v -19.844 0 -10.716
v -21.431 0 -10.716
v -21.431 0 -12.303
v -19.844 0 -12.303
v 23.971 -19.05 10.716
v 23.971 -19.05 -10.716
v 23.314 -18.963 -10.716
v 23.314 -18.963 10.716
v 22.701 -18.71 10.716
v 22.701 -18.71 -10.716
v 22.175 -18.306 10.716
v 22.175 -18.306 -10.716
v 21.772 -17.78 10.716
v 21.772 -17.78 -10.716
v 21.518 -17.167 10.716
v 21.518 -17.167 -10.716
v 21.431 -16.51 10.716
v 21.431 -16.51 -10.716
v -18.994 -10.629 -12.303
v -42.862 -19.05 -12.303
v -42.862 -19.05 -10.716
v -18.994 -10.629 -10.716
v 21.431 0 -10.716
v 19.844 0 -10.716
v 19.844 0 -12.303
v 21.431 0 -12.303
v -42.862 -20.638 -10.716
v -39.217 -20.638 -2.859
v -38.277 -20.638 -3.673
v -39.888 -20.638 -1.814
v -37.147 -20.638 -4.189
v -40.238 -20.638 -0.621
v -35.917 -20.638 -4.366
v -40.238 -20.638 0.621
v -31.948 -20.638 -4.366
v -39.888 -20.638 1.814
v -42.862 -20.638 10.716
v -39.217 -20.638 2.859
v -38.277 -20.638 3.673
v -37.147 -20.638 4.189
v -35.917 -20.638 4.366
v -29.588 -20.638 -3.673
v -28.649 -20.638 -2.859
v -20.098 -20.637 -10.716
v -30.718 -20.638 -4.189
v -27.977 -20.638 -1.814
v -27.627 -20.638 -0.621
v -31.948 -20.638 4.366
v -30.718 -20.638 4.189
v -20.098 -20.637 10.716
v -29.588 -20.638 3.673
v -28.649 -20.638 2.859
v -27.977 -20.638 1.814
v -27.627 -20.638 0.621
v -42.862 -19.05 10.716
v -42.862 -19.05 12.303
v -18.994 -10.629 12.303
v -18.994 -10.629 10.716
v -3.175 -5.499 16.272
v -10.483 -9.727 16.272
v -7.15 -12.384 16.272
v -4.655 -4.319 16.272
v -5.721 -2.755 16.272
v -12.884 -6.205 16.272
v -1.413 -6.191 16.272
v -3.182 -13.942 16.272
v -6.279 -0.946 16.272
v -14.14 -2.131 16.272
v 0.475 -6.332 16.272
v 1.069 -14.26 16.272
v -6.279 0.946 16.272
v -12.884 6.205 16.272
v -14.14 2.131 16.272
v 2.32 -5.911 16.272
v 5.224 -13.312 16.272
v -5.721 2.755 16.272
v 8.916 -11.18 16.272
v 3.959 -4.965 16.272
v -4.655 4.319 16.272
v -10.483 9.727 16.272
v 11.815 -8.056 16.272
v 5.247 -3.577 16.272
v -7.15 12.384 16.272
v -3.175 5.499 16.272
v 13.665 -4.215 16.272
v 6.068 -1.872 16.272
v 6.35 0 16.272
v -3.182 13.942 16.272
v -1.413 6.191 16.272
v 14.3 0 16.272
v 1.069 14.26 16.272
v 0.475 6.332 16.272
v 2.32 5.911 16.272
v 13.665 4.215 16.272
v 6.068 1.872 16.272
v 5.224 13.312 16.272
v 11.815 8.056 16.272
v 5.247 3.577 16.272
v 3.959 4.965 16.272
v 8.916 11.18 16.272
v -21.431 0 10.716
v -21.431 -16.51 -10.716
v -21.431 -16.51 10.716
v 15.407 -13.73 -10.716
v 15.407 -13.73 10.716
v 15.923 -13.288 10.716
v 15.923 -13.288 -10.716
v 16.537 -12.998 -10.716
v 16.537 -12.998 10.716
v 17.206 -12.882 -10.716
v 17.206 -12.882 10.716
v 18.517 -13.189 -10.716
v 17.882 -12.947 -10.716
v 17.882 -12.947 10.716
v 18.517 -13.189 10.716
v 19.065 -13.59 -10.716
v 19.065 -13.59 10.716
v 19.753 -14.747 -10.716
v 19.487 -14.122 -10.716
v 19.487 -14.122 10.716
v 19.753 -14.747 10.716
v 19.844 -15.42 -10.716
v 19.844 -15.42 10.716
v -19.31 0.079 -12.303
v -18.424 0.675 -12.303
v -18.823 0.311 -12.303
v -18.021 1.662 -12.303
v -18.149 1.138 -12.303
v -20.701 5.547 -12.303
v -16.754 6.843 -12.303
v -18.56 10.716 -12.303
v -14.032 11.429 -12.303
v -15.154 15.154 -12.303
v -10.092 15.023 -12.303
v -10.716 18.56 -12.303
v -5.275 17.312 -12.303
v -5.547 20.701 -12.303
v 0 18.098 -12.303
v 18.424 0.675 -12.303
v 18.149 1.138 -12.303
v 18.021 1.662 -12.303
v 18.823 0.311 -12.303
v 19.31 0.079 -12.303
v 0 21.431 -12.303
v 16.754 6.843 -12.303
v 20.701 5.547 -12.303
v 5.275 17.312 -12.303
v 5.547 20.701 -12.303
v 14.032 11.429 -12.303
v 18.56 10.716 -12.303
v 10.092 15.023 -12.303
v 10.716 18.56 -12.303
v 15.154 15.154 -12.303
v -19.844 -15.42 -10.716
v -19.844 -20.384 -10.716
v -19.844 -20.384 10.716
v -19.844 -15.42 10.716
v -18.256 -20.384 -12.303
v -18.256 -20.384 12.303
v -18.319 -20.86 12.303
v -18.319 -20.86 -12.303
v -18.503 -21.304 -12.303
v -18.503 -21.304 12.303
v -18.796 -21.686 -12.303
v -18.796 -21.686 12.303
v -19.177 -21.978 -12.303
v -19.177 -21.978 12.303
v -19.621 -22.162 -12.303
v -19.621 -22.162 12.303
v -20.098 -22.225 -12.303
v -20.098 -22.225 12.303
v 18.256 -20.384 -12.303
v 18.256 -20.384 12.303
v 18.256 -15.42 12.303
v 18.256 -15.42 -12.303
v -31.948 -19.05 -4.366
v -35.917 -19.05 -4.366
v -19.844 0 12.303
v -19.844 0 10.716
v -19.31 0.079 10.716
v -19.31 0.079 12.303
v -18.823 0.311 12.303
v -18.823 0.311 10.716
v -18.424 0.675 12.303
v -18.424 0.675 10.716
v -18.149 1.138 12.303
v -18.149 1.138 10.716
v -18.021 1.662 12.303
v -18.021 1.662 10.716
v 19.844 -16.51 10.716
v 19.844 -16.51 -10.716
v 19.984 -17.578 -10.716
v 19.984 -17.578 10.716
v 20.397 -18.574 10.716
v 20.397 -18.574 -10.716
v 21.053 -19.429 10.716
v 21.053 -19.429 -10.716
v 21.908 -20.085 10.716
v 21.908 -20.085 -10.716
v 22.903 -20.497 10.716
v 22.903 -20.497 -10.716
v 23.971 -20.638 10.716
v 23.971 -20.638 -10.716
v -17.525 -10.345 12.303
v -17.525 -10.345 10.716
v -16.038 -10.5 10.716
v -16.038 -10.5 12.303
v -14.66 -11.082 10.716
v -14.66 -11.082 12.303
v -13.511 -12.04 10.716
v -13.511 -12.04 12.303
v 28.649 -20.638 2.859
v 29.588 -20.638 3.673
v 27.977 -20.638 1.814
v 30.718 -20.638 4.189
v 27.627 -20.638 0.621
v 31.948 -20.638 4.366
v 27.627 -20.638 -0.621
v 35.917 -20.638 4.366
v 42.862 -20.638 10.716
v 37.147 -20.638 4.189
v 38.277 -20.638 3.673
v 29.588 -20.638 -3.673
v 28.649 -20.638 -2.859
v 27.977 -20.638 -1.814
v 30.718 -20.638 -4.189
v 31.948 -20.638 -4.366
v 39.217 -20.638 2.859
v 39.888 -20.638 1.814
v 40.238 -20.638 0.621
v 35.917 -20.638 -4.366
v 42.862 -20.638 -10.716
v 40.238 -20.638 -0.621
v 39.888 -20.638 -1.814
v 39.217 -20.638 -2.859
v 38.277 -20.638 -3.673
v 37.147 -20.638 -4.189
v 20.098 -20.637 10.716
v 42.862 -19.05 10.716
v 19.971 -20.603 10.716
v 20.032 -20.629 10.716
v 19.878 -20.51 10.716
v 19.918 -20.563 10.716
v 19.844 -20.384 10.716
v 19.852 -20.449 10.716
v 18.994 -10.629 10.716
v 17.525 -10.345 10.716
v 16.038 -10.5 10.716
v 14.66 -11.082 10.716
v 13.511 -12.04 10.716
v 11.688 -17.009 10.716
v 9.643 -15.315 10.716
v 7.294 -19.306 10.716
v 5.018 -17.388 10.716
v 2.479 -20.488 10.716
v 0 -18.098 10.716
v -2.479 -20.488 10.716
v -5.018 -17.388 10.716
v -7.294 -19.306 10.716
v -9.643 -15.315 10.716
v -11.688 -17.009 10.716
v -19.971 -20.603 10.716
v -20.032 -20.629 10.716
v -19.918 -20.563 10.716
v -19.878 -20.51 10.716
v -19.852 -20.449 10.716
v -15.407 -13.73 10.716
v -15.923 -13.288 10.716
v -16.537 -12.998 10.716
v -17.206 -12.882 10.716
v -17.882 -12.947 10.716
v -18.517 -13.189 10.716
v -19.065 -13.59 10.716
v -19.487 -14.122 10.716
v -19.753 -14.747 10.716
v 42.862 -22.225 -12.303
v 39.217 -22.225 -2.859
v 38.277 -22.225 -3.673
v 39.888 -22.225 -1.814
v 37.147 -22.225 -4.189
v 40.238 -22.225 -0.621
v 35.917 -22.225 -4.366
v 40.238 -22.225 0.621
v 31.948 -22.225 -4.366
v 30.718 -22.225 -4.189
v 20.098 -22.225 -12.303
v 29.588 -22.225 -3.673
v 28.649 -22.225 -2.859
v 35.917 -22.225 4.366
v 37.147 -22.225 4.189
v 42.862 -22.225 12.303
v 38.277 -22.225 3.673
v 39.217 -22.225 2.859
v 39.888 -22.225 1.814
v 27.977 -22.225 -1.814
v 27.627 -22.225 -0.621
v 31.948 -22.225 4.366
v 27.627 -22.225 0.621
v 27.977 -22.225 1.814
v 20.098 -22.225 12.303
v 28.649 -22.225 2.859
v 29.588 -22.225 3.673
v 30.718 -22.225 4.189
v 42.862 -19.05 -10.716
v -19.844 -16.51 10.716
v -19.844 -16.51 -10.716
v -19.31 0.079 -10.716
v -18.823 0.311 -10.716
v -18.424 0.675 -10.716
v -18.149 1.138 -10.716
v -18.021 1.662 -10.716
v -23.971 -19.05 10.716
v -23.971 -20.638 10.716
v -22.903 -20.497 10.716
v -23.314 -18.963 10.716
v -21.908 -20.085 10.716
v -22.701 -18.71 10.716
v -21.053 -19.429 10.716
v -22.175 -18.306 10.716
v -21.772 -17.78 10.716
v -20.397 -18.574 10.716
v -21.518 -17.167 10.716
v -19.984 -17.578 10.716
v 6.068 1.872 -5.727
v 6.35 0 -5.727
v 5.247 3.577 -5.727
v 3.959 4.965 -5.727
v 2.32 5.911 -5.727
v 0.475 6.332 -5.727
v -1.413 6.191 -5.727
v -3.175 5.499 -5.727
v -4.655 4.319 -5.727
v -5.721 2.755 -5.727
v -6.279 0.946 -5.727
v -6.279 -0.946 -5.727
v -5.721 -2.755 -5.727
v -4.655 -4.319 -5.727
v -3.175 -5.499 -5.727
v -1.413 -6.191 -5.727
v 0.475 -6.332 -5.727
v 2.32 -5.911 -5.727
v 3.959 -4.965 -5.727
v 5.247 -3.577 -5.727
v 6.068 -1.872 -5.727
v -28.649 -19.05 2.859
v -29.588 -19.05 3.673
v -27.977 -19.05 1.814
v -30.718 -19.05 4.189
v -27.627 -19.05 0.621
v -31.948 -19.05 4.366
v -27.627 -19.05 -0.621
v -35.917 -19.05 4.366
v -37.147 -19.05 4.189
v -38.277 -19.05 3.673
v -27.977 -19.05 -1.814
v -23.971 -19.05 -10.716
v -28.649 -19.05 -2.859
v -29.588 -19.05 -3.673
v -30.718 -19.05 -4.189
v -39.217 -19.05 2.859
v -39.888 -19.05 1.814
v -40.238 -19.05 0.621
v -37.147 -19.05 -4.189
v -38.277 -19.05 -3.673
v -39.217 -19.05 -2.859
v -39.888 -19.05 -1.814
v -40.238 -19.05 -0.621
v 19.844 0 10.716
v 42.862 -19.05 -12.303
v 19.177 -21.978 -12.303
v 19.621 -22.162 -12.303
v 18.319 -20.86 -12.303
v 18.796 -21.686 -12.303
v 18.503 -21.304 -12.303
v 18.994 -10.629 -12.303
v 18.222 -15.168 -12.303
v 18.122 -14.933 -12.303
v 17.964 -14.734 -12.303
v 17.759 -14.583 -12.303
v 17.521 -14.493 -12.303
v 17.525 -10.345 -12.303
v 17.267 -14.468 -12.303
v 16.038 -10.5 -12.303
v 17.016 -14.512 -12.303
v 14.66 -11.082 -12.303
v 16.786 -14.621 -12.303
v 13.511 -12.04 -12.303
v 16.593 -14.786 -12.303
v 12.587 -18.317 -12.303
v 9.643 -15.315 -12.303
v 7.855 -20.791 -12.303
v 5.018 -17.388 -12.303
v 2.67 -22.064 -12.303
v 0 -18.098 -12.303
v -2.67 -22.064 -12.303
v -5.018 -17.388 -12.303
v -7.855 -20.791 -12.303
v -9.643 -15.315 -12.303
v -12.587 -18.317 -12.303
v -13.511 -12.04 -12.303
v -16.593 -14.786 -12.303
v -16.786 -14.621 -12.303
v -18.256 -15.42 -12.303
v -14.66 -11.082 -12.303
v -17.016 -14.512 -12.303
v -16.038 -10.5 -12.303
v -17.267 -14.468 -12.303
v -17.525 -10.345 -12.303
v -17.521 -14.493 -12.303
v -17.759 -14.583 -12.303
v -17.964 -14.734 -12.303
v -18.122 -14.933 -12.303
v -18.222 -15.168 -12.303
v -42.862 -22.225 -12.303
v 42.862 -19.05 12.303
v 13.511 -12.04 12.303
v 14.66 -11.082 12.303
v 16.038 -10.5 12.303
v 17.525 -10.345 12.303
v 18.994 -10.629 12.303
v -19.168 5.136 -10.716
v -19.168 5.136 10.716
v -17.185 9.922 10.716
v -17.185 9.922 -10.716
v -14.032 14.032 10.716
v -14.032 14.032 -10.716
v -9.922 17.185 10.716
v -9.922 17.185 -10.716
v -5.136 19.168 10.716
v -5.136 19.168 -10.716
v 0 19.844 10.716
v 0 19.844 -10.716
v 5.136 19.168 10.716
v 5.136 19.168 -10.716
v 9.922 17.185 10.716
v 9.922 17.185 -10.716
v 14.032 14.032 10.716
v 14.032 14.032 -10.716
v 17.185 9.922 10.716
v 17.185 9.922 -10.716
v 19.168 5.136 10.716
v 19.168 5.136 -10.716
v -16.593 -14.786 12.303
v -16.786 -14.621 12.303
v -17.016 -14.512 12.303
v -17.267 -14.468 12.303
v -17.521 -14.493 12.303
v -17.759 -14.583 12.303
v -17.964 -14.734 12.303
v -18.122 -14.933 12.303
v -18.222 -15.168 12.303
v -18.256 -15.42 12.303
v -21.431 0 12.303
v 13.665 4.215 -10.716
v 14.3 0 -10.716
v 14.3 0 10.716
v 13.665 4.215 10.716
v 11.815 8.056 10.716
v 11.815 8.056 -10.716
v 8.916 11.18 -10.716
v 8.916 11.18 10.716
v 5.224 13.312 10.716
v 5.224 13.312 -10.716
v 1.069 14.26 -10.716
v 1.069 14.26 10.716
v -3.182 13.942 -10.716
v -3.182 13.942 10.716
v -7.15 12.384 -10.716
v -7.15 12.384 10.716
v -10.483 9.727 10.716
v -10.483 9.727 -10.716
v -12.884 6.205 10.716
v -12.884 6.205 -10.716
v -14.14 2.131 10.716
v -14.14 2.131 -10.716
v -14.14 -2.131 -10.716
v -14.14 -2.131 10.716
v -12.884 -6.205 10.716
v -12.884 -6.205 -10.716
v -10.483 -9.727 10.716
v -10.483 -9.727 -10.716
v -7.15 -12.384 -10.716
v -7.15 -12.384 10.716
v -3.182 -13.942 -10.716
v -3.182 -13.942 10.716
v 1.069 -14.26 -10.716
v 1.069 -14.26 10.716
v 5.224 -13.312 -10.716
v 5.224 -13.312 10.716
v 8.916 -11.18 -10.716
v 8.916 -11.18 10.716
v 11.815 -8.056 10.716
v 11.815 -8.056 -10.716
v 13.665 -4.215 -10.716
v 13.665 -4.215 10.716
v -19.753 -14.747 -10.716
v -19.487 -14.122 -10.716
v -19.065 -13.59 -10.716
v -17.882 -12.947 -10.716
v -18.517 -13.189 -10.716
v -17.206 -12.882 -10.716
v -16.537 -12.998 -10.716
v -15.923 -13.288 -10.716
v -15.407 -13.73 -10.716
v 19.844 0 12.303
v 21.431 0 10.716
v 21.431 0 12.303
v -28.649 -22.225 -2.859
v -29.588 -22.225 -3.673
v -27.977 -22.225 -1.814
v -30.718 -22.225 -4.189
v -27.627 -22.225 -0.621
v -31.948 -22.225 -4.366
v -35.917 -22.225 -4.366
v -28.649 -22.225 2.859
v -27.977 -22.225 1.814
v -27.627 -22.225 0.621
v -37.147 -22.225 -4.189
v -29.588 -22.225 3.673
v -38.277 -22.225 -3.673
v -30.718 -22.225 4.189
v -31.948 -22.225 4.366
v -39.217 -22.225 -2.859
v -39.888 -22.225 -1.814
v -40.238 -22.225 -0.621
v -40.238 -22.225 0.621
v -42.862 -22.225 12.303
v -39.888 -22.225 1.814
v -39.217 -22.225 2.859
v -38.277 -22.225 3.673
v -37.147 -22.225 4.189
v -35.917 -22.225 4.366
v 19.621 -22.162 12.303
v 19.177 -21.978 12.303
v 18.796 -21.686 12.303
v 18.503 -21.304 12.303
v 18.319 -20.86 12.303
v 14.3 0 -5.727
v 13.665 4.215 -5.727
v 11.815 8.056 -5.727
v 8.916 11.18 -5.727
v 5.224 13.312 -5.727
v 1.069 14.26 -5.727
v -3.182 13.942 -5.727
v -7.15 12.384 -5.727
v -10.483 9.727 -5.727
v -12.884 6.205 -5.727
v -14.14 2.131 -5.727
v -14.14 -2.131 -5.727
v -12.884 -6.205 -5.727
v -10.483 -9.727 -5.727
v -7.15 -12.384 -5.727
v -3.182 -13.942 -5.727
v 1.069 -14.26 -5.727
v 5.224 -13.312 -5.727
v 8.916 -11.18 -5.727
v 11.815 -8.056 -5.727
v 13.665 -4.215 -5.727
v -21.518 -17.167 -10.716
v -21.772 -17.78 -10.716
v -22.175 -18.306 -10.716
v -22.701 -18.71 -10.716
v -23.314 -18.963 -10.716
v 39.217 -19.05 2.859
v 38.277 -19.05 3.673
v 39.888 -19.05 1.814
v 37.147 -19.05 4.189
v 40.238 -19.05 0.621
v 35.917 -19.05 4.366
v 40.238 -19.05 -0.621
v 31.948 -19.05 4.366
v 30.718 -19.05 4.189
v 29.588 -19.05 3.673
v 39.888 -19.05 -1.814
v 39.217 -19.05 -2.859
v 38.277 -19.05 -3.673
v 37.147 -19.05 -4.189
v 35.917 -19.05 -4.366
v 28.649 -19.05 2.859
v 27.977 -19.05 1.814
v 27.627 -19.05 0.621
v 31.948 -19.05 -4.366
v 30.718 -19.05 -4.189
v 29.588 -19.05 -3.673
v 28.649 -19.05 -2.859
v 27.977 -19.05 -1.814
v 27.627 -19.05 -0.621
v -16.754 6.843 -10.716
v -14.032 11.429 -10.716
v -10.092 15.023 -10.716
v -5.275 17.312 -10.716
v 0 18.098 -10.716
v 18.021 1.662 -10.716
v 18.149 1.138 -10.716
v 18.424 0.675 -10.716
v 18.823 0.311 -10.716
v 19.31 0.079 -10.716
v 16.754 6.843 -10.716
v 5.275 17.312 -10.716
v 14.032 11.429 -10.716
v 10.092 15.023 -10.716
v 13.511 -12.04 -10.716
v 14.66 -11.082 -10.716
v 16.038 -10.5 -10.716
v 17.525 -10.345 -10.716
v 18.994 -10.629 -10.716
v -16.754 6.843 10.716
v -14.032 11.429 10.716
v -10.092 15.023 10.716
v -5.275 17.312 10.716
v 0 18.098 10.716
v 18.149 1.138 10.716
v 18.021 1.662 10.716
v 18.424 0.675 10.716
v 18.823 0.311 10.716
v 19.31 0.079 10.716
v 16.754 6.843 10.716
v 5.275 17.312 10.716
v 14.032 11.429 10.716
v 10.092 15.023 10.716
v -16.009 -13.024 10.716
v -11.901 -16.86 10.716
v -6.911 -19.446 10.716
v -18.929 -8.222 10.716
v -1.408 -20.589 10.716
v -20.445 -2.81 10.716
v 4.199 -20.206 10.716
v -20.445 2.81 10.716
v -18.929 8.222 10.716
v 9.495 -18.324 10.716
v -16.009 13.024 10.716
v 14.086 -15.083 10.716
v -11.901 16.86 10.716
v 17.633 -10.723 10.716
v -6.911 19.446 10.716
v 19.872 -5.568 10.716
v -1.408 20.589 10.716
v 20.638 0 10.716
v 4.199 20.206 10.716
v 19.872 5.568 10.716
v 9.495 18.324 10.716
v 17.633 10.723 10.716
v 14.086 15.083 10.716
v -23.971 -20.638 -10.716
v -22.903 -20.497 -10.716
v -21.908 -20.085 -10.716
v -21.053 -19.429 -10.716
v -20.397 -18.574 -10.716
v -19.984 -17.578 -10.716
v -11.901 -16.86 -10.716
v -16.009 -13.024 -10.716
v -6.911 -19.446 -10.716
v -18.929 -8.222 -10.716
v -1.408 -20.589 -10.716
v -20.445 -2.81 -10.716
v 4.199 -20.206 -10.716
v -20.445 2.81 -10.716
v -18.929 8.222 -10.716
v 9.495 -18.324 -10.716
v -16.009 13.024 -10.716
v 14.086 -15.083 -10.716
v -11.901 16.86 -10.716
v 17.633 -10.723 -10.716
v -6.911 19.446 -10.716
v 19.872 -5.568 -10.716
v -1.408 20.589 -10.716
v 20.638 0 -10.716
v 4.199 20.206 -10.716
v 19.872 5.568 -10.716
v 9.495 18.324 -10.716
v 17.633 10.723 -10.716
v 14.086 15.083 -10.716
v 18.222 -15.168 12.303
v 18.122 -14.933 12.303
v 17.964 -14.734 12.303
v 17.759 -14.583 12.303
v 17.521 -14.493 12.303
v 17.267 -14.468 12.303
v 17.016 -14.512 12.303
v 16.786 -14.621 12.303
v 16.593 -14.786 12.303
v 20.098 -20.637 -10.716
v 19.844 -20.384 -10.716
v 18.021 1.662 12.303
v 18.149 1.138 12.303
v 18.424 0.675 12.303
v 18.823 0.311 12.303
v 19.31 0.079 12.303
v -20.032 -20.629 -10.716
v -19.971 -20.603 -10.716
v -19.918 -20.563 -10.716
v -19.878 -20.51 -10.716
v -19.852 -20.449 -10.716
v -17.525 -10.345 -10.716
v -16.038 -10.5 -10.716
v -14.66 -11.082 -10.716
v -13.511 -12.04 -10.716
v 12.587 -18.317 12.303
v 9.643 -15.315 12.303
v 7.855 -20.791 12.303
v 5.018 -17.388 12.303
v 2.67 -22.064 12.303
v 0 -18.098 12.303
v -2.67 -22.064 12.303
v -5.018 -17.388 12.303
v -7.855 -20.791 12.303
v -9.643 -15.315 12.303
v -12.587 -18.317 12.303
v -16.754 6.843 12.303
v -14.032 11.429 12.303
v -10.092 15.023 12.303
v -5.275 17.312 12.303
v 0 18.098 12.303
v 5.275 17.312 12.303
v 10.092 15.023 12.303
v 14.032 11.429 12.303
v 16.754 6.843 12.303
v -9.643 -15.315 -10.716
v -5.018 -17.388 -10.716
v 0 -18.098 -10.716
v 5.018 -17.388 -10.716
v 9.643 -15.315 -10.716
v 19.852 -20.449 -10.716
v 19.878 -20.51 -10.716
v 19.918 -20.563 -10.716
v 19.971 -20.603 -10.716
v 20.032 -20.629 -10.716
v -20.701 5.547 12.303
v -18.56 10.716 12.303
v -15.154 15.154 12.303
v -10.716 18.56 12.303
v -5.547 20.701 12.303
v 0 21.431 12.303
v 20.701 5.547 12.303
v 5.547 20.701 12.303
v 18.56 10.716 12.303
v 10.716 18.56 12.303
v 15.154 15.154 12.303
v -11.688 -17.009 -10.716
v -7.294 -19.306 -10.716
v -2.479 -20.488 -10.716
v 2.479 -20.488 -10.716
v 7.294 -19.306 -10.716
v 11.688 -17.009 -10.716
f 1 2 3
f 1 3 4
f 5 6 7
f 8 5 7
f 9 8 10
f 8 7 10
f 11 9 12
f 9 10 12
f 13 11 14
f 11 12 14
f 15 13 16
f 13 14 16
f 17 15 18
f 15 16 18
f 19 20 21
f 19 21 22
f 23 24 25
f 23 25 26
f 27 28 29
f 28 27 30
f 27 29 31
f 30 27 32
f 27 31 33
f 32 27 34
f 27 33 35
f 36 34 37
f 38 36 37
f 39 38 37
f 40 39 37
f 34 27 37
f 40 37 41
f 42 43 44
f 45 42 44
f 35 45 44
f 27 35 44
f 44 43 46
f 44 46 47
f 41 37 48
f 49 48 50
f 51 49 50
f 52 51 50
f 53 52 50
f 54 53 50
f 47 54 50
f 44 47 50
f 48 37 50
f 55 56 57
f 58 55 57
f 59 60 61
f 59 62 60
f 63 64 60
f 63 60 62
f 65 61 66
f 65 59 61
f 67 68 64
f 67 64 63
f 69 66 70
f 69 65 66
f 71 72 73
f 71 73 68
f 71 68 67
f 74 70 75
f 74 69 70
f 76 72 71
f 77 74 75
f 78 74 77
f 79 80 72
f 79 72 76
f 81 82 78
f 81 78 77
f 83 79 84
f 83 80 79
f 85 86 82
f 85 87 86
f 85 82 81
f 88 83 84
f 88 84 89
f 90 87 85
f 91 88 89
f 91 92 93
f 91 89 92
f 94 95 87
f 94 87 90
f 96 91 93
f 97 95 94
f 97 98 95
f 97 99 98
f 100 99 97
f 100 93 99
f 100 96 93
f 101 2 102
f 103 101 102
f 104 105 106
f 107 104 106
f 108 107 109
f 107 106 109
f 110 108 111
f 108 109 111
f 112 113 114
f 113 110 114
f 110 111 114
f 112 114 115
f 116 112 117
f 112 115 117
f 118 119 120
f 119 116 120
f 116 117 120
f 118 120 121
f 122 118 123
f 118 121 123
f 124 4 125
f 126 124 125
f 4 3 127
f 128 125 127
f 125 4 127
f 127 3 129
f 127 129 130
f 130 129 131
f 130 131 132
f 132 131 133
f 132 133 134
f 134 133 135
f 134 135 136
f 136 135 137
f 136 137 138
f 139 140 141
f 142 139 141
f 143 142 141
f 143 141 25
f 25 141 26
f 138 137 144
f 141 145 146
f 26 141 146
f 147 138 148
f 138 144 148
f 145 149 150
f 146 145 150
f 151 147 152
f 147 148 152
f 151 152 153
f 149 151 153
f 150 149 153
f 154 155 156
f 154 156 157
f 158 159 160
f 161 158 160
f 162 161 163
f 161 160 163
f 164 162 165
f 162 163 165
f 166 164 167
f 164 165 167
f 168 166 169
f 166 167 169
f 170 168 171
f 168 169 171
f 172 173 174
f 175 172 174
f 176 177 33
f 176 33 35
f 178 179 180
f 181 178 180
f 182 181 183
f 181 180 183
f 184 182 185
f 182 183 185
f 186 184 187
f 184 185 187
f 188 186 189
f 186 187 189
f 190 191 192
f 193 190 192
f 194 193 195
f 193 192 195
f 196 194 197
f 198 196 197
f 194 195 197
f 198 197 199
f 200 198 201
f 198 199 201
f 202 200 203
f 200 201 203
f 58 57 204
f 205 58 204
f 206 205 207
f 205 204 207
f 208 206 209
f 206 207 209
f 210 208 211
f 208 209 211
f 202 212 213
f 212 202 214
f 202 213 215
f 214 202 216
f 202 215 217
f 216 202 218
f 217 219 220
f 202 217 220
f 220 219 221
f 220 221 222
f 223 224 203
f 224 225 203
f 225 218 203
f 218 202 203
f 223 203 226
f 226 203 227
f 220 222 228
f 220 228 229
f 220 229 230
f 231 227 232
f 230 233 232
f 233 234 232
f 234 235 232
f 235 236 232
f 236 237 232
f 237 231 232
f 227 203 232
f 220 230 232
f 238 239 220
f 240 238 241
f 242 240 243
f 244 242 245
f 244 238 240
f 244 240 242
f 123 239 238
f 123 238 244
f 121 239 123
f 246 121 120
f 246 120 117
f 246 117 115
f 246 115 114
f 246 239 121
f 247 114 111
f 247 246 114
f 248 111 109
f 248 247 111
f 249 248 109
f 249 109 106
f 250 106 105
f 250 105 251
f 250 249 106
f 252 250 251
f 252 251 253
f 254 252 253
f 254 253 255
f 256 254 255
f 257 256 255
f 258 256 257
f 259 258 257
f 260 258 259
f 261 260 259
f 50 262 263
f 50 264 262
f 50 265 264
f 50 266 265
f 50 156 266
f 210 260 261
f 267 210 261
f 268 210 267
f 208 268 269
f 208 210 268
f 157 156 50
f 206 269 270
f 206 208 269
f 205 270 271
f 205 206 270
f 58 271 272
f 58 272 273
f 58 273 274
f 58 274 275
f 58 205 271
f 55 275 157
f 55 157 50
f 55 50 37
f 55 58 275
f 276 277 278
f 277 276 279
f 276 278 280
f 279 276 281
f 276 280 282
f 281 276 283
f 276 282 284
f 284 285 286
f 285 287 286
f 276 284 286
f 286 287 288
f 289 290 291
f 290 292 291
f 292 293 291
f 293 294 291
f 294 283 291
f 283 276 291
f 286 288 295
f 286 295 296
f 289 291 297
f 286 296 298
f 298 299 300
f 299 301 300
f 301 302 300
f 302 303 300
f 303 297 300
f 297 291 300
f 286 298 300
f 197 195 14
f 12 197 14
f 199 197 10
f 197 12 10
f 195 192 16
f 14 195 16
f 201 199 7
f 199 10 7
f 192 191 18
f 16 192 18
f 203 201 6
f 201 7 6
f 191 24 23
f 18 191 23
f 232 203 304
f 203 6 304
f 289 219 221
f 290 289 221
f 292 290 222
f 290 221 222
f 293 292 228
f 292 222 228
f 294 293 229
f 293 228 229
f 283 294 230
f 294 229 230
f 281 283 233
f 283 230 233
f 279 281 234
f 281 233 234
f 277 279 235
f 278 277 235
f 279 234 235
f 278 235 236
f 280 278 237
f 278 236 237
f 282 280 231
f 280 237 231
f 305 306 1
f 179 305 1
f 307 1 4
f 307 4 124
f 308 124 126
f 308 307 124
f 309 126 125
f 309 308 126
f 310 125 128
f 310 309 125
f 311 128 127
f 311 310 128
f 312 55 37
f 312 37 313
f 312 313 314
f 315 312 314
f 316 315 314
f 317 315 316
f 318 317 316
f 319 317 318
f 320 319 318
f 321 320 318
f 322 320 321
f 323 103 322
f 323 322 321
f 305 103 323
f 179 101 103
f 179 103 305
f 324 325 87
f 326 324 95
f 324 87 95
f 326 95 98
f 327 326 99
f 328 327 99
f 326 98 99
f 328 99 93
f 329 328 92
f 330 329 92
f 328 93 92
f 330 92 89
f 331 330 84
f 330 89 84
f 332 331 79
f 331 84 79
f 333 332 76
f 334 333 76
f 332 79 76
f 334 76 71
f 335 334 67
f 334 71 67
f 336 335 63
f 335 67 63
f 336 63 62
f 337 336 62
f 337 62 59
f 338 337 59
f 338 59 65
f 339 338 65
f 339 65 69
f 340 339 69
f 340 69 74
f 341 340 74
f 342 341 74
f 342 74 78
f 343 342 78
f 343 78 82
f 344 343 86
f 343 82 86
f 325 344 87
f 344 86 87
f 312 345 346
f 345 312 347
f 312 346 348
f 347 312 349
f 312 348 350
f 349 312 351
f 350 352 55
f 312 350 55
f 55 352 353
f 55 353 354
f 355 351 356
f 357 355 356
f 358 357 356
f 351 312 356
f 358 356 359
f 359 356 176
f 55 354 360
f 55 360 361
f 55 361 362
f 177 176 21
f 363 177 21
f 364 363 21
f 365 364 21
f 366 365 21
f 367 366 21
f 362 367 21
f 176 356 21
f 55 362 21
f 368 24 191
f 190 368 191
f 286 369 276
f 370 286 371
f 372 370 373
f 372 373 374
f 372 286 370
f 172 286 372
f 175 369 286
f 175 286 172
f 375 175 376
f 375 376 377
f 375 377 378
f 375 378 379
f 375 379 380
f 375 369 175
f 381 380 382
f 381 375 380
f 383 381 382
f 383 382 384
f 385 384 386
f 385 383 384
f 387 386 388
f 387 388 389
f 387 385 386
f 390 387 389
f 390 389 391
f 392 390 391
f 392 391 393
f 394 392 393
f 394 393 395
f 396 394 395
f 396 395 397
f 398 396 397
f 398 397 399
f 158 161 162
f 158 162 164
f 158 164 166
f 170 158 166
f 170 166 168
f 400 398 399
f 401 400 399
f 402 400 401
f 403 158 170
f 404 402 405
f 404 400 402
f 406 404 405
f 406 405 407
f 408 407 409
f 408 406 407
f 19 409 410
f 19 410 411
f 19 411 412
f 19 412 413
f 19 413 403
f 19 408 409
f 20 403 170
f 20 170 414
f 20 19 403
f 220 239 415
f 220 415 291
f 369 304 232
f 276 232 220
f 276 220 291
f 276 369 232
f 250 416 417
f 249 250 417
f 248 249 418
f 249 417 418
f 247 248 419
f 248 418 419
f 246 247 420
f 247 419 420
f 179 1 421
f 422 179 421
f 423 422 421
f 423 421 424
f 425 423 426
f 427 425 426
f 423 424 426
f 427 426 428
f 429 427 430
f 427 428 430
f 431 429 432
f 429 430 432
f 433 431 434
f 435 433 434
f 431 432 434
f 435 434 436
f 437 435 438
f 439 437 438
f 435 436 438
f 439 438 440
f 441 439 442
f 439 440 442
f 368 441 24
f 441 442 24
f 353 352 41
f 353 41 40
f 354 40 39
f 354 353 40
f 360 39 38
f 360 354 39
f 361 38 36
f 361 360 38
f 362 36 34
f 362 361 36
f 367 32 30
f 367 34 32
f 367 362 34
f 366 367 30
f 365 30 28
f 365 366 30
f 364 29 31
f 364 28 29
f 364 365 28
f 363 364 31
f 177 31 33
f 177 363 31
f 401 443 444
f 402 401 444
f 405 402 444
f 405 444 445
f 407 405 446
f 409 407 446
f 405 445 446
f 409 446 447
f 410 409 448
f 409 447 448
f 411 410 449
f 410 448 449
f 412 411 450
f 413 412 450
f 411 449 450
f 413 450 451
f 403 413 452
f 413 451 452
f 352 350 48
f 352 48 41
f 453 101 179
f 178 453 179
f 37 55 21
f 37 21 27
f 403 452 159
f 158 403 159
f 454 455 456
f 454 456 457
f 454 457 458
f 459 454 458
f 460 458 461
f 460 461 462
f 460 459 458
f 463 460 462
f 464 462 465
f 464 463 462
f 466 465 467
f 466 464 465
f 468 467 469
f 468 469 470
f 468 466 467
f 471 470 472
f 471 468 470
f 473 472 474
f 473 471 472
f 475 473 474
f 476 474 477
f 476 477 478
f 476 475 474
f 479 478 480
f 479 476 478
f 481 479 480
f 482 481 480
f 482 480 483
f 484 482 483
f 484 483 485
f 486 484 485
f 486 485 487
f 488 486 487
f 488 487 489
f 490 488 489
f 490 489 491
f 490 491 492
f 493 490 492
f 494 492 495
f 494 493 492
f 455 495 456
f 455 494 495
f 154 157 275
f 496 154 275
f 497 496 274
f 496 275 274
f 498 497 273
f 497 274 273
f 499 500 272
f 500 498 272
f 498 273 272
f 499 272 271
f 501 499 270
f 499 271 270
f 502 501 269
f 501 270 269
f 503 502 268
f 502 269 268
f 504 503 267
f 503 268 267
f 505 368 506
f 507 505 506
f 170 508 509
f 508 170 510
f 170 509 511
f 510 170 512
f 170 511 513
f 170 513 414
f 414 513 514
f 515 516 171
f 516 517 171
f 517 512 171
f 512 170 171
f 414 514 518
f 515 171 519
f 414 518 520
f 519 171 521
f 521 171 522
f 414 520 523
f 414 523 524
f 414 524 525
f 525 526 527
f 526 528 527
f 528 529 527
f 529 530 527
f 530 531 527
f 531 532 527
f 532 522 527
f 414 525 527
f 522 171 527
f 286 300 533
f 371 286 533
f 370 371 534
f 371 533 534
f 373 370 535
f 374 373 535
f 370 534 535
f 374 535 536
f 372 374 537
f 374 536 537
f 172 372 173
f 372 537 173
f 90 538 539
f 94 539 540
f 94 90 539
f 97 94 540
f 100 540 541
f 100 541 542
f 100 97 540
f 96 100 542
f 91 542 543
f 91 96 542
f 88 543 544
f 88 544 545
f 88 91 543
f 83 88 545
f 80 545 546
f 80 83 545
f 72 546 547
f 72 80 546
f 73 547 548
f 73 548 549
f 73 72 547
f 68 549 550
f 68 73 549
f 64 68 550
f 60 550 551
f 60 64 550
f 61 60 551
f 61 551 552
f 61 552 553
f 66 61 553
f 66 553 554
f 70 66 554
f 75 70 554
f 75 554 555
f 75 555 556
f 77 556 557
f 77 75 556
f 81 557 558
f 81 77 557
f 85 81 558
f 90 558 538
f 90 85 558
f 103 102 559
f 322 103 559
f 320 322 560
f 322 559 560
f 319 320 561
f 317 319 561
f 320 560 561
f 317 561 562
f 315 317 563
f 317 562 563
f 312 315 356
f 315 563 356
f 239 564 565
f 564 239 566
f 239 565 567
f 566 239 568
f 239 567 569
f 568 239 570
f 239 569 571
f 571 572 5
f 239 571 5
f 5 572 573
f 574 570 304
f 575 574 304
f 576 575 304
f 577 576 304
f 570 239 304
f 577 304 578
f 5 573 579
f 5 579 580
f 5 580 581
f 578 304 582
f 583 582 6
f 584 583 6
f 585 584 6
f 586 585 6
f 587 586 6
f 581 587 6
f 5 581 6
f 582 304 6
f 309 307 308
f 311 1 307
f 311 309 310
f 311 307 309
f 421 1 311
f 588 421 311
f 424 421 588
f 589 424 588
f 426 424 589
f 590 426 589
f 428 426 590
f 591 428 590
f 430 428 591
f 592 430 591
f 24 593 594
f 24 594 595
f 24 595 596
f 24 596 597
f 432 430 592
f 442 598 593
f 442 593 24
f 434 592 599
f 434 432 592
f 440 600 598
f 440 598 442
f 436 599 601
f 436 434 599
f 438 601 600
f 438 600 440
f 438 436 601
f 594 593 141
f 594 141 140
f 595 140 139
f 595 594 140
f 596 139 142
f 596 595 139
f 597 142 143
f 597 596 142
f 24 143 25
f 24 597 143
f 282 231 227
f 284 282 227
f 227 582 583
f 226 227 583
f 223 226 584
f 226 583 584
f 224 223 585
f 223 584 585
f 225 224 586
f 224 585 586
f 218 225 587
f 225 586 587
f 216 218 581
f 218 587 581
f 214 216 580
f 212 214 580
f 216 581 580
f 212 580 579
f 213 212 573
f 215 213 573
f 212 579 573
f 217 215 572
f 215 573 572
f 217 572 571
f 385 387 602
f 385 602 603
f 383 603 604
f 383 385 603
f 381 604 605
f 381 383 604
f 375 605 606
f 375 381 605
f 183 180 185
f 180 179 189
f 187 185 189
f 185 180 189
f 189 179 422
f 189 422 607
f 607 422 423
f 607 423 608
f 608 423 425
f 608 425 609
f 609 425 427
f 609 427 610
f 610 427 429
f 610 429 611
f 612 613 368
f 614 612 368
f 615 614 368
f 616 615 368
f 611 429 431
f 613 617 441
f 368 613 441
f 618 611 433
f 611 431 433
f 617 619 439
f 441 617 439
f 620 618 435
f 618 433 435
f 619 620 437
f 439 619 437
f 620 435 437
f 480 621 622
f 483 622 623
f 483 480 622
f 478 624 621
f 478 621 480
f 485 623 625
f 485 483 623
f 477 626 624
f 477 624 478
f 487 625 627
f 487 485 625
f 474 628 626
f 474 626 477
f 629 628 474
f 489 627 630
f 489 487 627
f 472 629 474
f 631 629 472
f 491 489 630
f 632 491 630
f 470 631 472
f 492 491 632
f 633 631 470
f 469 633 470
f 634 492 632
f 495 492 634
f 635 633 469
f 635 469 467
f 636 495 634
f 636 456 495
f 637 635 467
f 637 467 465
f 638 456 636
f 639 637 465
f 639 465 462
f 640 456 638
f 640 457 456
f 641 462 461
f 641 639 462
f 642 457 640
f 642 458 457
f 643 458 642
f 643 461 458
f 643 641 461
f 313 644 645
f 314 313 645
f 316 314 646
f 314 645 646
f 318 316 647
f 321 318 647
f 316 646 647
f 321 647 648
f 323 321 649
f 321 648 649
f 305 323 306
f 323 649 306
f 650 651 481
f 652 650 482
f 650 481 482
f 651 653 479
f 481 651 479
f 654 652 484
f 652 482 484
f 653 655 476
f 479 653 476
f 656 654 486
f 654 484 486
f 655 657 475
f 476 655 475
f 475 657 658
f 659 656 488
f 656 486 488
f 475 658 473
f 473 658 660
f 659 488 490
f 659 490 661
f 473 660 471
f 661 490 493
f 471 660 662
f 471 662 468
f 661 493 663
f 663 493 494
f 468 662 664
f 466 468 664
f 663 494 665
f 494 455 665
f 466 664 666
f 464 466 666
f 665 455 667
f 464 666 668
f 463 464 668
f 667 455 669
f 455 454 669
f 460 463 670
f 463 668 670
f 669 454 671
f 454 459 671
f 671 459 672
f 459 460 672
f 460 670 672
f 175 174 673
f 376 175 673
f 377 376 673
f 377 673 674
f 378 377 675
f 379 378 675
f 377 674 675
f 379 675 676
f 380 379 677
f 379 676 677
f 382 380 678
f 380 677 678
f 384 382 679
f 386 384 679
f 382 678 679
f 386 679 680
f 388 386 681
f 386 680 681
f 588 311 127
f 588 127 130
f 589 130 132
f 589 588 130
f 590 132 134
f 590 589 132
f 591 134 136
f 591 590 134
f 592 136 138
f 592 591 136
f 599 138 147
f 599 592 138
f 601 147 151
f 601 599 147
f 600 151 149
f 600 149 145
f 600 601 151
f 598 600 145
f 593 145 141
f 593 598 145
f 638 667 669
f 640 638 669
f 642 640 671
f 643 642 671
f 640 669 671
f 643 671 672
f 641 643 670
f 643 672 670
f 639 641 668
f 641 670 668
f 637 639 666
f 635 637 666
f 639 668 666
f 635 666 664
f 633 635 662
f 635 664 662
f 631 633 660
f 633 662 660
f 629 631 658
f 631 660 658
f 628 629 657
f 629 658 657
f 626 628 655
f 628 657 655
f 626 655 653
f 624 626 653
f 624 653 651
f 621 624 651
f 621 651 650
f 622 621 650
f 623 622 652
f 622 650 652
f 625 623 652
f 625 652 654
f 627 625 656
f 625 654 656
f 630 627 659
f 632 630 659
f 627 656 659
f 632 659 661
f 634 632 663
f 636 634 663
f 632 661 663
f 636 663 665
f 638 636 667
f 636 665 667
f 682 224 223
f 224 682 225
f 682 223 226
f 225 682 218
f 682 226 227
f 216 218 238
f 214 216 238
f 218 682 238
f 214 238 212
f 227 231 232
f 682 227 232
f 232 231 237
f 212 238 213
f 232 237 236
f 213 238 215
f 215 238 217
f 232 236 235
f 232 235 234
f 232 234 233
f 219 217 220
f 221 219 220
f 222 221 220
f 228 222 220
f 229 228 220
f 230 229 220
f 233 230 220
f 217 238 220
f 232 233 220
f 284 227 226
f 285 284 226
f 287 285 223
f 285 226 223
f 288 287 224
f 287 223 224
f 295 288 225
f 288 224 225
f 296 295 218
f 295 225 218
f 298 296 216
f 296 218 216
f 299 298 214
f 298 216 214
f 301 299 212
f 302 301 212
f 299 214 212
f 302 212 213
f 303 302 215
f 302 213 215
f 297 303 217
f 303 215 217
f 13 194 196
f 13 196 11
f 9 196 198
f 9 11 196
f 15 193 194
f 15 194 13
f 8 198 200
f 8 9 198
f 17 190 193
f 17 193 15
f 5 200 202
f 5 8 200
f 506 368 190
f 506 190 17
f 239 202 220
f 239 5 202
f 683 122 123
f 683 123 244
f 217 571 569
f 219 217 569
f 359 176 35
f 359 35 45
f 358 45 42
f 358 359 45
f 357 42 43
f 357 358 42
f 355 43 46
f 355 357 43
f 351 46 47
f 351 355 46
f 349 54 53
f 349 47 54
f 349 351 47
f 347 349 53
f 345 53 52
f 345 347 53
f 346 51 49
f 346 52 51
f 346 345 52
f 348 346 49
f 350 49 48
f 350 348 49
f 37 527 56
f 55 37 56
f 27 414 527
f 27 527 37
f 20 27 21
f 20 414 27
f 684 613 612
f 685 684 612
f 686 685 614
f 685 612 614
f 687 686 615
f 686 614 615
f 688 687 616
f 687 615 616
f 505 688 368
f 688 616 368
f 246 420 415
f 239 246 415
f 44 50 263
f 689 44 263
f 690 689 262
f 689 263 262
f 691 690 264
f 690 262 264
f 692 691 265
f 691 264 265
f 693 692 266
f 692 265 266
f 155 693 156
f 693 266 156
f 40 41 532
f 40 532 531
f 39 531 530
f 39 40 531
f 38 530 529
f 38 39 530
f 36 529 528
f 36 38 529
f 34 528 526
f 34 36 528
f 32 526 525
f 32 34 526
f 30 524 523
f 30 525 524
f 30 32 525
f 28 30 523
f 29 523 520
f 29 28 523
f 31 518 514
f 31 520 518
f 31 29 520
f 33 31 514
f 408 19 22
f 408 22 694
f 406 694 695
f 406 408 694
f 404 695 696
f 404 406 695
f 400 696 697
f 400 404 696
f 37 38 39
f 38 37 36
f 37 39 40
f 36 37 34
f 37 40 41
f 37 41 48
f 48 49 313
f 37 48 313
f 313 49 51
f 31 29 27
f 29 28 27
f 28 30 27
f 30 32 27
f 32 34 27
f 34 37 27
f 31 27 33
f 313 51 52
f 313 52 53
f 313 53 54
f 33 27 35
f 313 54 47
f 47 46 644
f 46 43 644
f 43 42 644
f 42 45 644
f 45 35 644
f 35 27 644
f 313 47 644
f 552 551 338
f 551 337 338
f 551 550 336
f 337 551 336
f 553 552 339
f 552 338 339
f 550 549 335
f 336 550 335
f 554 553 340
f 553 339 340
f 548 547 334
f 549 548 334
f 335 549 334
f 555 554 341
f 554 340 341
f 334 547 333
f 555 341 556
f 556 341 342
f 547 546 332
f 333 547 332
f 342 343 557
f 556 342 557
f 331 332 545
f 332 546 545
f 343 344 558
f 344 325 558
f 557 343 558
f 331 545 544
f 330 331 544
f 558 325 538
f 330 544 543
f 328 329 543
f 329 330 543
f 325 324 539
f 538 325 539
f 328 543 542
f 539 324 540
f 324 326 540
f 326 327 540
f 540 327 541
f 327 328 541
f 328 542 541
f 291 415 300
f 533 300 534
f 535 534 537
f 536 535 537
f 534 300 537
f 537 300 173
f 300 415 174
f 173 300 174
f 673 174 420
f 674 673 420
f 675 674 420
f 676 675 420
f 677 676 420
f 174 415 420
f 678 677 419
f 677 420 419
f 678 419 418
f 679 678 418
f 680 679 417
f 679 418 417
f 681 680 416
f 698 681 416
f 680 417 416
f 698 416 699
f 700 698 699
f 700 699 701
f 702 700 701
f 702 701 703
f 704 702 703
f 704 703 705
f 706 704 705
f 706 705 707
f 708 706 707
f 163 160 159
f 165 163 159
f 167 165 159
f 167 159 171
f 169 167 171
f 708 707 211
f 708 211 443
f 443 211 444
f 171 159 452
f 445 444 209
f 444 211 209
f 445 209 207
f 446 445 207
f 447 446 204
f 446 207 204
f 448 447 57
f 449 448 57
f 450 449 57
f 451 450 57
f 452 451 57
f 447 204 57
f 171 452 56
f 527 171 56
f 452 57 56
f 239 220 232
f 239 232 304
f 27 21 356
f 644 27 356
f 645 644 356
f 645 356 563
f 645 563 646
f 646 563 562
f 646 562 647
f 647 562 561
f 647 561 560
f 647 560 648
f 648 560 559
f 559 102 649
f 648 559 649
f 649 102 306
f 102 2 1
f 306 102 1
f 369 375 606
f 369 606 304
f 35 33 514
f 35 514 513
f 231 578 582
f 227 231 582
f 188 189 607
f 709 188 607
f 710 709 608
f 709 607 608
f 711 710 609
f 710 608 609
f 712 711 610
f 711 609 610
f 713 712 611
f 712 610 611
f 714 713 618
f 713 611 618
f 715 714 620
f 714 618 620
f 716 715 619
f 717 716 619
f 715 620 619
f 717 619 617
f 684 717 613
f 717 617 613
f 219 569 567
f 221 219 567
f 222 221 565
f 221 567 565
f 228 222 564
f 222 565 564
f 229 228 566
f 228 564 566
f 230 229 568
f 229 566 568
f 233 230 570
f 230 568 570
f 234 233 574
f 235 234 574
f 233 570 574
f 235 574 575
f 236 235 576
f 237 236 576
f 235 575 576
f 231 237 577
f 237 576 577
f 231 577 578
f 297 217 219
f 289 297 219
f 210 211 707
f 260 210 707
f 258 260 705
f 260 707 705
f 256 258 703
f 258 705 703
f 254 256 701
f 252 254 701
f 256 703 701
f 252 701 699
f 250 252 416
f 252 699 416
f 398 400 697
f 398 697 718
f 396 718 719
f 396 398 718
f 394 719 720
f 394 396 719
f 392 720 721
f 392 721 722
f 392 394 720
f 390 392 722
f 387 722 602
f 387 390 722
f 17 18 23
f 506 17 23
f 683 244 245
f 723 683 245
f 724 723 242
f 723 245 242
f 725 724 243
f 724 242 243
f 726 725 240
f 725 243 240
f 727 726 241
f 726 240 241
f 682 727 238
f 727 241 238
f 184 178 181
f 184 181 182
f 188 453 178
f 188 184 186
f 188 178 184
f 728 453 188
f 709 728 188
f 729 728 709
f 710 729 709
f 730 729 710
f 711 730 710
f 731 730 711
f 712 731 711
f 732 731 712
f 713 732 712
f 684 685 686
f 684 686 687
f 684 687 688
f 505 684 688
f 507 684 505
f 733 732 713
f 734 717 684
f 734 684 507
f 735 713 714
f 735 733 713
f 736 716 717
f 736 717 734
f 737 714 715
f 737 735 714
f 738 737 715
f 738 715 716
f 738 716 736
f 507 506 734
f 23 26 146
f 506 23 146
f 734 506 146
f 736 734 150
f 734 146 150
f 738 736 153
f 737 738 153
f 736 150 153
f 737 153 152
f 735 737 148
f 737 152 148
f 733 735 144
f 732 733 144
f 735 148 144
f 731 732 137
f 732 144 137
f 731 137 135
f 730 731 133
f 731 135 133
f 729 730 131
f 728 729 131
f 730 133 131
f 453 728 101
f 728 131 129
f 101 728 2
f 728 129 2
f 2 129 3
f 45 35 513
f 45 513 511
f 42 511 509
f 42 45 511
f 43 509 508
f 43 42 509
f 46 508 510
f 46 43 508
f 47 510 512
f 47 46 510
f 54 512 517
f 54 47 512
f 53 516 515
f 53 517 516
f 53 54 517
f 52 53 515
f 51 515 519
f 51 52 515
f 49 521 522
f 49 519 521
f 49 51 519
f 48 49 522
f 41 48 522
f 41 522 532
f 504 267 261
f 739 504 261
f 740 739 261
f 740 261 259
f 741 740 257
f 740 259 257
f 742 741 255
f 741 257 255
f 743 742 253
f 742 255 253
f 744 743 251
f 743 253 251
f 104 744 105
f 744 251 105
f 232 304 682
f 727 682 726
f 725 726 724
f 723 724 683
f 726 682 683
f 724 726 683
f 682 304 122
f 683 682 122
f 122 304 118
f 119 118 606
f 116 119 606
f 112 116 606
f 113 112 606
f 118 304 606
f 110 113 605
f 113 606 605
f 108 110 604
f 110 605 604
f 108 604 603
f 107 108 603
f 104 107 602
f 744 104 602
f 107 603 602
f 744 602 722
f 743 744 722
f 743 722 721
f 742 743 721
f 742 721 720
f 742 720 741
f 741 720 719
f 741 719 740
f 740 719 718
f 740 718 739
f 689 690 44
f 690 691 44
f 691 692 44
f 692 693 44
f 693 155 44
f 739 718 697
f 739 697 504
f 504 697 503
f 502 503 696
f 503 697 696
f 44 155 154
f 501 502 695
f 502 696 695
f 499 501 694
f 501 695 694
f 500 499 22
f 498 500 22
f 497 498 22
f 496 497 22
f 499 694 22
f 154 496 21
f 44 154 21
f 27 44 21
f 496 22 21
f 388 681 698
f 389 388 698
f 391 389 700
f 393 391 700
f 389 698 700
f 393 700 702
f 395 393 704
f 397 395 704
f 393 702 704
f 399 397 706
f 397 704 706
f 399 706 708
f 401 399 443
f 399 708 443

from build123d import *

# Parameters (mm, degrees)
EXTRUDE_THIN2_DEPTH  = 12.303125
EXTRUDE1_DEPTH       = 1.5875
EXTRUDE_THIN3_START  = -10.715625
EXTRUDE_THIN3_DEPTH  = 21.43125
EXTRUDE2_DEPTH       = 1.5875
EXTRUDE3_START       = -10.715625
EXTRUDE3_OUTLINE_R   = 20.6375
EXTRUDE3_OUTLINE_R_2 = 14.3002
EXTRUDE3_DEPTH       = 21.43125
SKETCH8_R            = 14.3002
SKETCH8_R_2          = 6.35
EXTRUDE4_DEPTH       = 21.99894
CUT_EXTRUDE1_DEPTH   = 51.950156499


# Read off the part's stored shape, not the designer's step: Extrude-Thin3, Extrude3
with BuildPart() as part:
    # Sketch1 → Extrude-Thin2 (new, symmetric)
    with BuildSketch(Plane.XY):
        with BuildLine():
            Line((-42.8625, -20.6375), (-20.09775, -20.6375))
            ThreePointArc((-20.09775, -20.6375), (-19.918144878, -20.563105122), (-19.84375, -20.3835))
            Line((-19.84375, -20.3835), (-19.84375, -15.420011096))
            ThreePointArc((-19.84375, -15.420011096), (-18.207905551, -13.0463846), (-15.40744863, -13.730146866))
            ThreePointArc((-15.40744863, -13.730146866), (0, -20.6375), (15.40744863, -13.730146866))
            ThreePointArc((15.40744863, -13.730146866), (18.207905551, -13.0463846), (19.84375, -15.420011096))
            Line((19.84375, -15.420011096), (19.84375, -20.3835))
            ThreePointArc((19.84375, -20.3835), (19.918144878, -20.563105122), (20.09775, -20.6375))
            Line((20.09775, -20.6375), (42.8625, -20.6375))
            Line((42.8625, -20.6375), (42.8625, -22.225))
            Line((42.8625, -22.225), (20.09775, -22.225))
            ThreePointArc((20.09775, -22.225), (18.795612862, -21.685637138), (18.25625, -20.3835))
            Line((18.25625, -20.3835), (18.25625, -15.420011096))
            ThreePointArc((18.25625, -15.420011096), (17.642808332, -14.52990116), (16.592636986, -14.786312009))
            ThreePointArc((16.592636986, -14.786312009), (0, -22.225), (-16.592636986, -14.786312009))
            ThreePointArc((-16.592636986, -14.786312009), (-17.642808332, -14.52990116), (-18.25625, -15.420011096))
            Line((-18.25625, -15.420011096), (-18.25625, -20.3835))
            ThreePointArc((-18.25625, -20.3835), (-18.795612862, -21.685637138), (-20.09775, -22.225))
            Line((-20.09775, -22.225), (-42.8625, -22.225))
            Line((-42.8625, -22.225), (-42.8625, -20.6375))
        make_face()
    extrude(amount=EXTRUDE_THIN2_DEPTH, both=True)

    # Sketch4 → Extrude1 (add)
    with BuildSketch(Plane.XY.offset(12.303125)):
        with BuildLine():
            Line((-42.8625, -19.05), (-18.993828558, -10.629391671))
            ThreePointArc((-18.993828558, -10.629391671), (-16.037730525, -10.500296197), (-13.51114726, -12.040282636))
            ThreePointArc((-13.51114726, -12.040282636), (0, -18.0975), (13.51114726, -12.040282636))
            ThreePointArc((13.51114726, -12.040282636), (16.037730525, -10.500296197), (18.993828558, -10.629391671))
            Line((18.993828558, -10.629391671), (42.8625, -19.05))
            Line((42.8625, -19.05), (42.8625, -22.225))
            Line((42.8625, -22.225), (20.09775, -22.225))
            ThreePointArc((20.09775, -22.225), (18.795612862, -21.685637138), (18.25625, -20.3835))
            Line((18.25625, -20.3835), (18.25625, -15.420011096))
            ThreePointArc((18.25625, -15.420011096), (17.642808332, -14.52990116), (16.592636986, -14.786312009))
            ThreePointArc((16.592636986, -14.786312009), (0, -22.225), (-16.592636986, -14.786312009))
            ThreePointArc((-16.592636986, -14.786312009), (-17.642808332, -14.52990116), (-18.25625, -15.420011096))
            Line((-18.25625, -15.420011096), (-18.25625, -20.3835))
            ThreePointArc((-18.25625, -20.3835), (-18.795612862, -21.685637138), (-20.09775, -22.225))
            Line((-20.09775, -22.225), (-42.8625, -22.225))
            Line((-42.8625, -22.225), (-42.8625, -19.05))
        make_face()
    extrude1 = extrude(amount=-EXTRUDE1_DEPTH)

    # Mirror1: Extrude1 across plane
    add(extrude1.mirror(Plane.XY))


with BuildPart() as body_2:
    # Extrude-Thin3 outline → Extrude-Thin3 (new body)
    with BuildSketch(Plane.XY.offset(EXTRUDE_THIN3_START)):
        with BuildLine():
            Line((-23.97125, -19.05), (-42.8625, -19.05))
            Line((-42.8625, -19.05), (-42.8625, -20.6375))
            Line((-42.8625, -20.6375), (-23.97125, -20.6375))
            ThreePointArc((-23.97125, -20.6375), (-21.052666761, -19.428583239), (-19.84375, -16.51))
            Line((-19.84375, -16.51), (-19.84375, 0))
            ThreePointArc((-19.84375, 0), (0, 19.84375), (19.84375, 0))
            Line((19.84375, 0), (19.84375, -16.51))
            ThreePointArc((19.84375, -16.51), (21.052666761, -19.428583239), (23.97125, -20.6375))
            Line((23.97125, -20.6375), (42.8625, -20.6375))
            Line((42.8625, -20.6375), (42.8625, -19.05))
            Line((42.8625, -19.05), (23.97125, -19.05))
            ThreePointArc((23.97125, -19.05), (22.175198776, -18.306051224), (21.43125, -16.51))
            Line((21.43125, -16.51), (21.43125, 0))
            ThreePointArc((21.43125, 0), (0, 21.43125), (-21.43125, 0))
            Line((-21.43125, 0), (-21.43125, -16.51))
            ThreePointArc((-21.43125, -16.51), (-22.175198776, -18.306051224), (-23.97125, -19.05))
        make_face()
    extrude(amount=EXTRUDE_THIN3_DEPTH)

    # Sketch6 → Extrude2 (add)
    with BuildSketch(Plane(origin=(0, 0, -10.715625), x_dir=(-1, 0, 0), z_dir=(0, 0, -1))):
        with BuildLine():
            Line((-19.84375, 0), (-21.43125, 0))
            ThreePointArc((-21.43125, 0), (0, 21.43125), (21.43125, 0))
            Line((21.43125, 0), (19.84375, 0))
            ThreePointArc((19.84375, 0), (18.610270538, 0.477999494), (18.020989833, 1.662357273))
            ThreePointArc((18.020989833, 1.662357273), (0, 18.0975), (-18.020989833, 1.662357273))
            ThreePointArc((-18.020989833, 1.662357273), (-18.610270538, 0.477999494), (-19.84375, 0))
        make_face()
    extrude2 = extrude(amount=EXTRUDE2_DEPTH)

    # Mirror2: Extrude2 across plane
    add(extrude2.mirror(Plane.XY))


with BuildPart() as body_3:
    # Extrude3 outline → Extrude3 (new body)
    with BuildSketch(Plane.XY.offset(EXTRUDE3_START)):
        Circle(EXTRUDE3_OUTLINE_R)
        Circle(EXTRUDE3_OUTLINE_R_2, mode=Mode.SUBTRACT)
    extrude(amount=EXTRUDE3_DEPTH)


with BuildPart() as body_4:
    # Sketch8 → Extrude4 (new body)
    with BuildSketch(Plane.XY.offset(16.271875)):
        Circle(SKETCH8_R)
        Circle(SKETCH8_R_2, mode=Mode.SUBTRACT)
    extrude(amount=-EXTRUDE4_DEPTH)


with BuildPart() as cut_extrude1_tool:
    # Sketch3 → Cut-Extrude1 (new, through all)
    with BuildSketch(Plane(origin=(0, 0, 0), x_dir=(1, 0, 0), z_dir=(0, 1, 0))):
        with BuildLine():
            Line((-35.9171875, 4.365625), (-31.9484375, 4.365625))
            ThreePointArc((-31.9484375, 4.365625), (-27.5828125, 0), (-31.9484375, -4.365625))
            Line((-31.9484375, -4.365625), (-35.9171875, -4.365625))
            ThreePointArc((-35.9171875, -4.365625), (-40.2828125, 0), (-35.9171875, 4.365625))
        make_face()
        with BuildLine():
            Line((31.9484375, -4.365625), (35.9171875, -4.365625))
            ThreePointArc((35.9171875, -4.365625), (40.2828125, 0), (35.9171875, 4.365625))
            Line((35.9171875, 4.365625), (31.9484375, 4.365625))
            ThreePointArc((31.9484375, 4.365625), (27.5828125, 0), (31.9484375, -4.365625))
        make_face()
    extrude(amount=-CUT_EXTRUDE1_DEPTH)


with BuildPart() as part_1:
    add(part.part)

    # Cut-Extrude1: cut by cut_extrude1_tool
    add(cut_extrude1_tool.part, mode=Mode.SUBTRACT)


with BuildPart() as body_2_1:
    add(body_2.part)

    # Cut-Extrude1: cut by cut_extrude1_tool
    add(cut_extrude1_tool.part, mode=Mode.SUBTRACT)


solid = Compound([body_3.part, body_4.part, part_1.part, body_2_1.part])
